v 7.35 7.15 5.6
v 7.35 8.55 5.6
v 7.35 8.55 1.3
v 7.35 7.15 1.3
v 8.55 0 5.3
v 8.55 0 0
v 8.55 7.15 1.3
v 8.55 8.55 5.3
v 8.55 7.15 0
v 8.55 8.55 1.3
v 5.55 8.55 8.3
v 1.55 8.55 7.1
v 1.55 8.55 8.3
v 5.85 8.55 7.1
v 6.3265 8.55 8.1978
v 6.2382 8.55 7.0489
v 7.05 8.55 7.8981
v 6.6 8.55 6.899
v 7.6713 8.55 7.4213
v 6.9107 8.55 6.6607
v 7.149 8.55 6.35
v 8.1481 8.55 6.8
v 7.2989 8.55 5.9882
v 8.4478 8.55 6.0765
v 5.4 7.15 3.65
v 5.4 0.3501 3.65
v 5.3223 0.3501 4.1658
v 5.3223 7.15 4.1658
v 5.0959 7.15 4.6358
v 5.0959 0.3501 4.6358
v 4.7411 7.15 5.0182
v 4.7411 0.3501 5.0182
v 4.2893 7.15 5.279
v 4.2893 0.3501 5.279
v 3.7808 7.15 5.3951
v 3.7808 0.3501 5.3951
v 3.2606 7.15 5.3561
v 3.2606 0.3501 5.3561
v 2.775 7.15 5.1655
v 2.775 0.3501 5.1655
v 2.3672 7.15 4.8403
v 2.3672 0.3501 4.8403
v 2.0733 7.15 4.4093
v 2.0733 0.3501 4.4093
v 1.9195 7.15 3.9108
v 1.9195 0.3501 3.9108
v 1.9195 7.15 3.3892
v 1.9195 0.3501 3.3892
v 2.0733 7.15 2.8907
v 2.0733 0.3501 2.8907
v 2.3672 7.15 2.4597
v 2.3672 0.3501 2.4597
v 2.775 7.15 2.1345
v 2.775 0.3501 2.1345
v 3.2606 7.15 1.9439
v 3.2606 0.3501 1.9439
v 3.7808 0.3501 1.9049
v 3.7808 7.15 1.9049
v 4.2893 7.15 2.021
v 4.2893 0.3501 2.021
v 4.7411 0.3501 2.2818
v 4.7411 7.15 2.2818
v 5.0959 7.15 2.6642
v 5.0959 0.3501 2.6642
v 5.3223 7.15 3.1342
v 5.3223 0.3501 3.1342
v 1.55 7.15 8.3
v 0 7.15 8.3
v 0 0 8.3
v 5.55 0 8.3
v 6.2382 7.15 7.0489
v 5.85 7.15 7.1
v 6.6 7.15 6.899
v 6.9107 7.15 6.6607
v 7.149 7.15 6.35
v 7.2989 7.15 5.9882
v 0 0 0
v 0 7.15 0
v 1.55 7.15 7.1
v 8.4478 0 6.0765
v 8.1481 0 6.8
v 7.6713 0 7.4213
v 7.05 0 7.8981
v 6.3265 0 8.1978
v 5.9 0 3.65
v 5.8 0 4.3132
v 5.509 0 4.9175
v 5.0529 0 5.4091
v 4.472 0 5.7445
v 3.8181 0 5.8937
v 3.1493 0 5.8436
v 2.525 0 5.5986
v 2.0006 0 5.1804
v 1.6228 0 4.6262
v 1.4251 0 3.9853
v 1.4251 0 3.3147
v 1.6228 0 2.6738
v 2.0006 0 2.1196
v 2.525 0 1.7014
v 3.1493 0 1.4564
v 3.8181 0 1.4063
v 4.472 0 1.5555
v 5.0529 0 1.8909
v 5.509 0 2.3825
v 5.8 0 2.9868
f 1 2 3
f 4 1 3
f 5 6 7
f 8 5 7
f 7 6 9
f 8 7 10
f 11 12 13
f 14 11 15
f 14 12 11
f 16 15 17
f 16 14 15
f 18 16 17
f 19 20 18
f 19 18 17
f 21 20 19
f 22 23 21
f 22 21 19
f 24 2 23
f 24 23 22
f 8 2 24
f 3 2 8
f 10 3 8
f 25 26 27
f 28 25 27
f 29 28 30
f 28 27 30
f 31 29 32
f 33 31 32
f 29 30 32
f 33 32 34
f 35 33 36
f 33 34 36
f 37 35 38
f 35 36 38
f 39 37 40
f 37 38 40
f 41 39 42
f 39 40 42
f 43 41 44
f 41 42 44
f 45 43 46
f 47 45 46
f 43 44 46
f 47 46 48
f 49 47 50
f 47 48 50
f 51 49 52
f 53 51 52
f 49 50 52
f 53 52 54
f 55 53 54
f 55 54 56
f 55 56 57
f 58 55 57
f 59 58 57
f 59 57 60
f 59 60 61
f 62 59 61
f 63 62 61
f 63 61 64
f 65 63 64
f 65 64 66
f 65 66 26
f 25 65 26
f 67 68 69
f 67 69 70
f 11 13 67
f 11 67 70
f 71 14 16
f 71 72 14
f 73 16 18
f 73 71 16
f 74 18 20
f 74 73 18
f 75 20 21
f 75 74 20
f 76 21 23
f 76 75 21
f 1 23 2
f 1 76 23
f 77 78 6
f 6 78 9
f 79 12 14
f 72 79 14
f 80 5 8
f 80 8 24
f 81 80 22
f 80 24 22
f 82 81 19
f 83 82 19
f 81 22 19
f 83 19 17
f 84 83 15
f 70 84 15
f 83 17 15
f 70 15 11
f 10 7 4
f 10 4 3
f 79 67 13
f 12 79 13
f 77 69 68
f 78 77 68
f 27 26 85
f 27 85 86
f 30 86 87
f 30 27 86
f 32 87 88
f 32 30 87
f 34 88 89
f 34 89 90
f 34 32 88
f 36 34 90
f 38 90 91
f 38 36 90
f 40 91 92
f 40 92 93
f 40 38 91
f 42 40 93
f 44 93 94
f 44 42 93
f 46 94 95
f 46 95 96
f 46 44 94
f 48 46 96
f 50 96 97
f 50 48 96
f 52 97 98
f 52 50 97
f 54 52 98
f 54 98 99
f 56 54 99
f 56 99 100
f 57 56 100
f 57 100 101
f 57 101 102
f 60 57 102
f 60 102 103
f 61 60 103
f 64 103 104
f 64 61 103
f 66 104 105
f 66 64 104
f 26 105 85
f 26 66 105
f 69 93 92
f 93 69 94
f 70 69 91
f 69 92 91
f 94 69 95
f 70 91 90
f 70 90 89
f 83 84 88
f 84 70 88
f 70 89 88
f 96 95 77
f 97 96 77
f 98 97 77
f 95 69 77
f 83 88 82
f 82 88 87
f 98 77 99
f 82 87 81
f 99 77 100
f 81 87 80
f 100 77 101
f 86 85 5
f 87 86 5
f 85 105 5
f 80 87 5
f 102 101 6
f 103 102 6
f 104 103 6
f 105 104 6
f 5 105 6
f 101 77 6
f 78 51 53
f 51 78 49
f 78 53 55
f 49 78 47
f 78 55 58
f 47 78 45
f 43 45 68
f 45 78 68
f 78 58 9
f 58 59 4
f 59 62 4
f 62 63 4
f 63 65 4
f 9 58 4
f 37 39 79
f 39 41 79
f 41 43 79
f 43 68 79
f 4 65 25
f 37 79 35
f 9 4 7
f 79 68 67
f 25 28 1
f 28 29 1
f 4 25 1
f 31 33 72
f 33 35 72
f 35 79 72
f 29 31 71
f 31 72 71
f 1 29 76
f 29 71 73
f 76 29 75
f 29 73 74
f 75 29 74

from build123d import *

# Parameters (mm, degrees)
SKETCH1_W           = 8.55
SKETCH1_H           = 8.55
BOSS_EXTRUDE1_DEPTH = 8.3
SKETCH2_W           = 1.55
SKETCH2_H           = 1.4
CUT_EXTRUDE1_DEPTH  = 9.3
SKETCH3_W           = 1.3
SKETCH3_H           = 1.4
CUT_EXTRUDE2_DEPTH  = 9.55
SKETCH4_W           = 5.8
SKETCH4_H           = 5.8
CUT_EXTRUDE3_DEPTH  = 1.4
FILLET1_R           = 1.5
FILLET2_R           = 3
SKETCH5_R           = 1.75
CUT_EXTRUDE4_DEPTH  = 9.55
CHAMFER1_SIZE       = 0.5
CHAMFER1_SIZE2      = 0.350103769


with BuildPart() as part:
    # Sketch1 → Boss-Extrude1 (new body)
    with BuildSketch(Plane.XY):
        with Locations((4.275, 4.275)):
            Rectangle(SKETCH1_W, SKETCH1_H)
    extrude(amount=BOSS_EXTRUDE1_DEPTH)

    # Sketch2 → Cut-Extrude1 (cut, through all)
    with BuildSketch(Plane.XY.offset(8.3)):
        with Locations((0.775, 7.85)):
            Rectangle(SKETCH2_W, SKETCH2_H)
    extrude(amount=-CUT_EXTRUDE1_DEPTH, mode=Mode.SUBTRACT)

    # Sketch3 → Cut-Extrude2 (cut, through all)
    with BuildSketch(Plane(origin=(8.55, 0, 0), x_dir=(0, 0, -1), z_dir=(1, 0, 0))):
        with Locations((-0.65, 7.85)):
            Rectangle(SKETCH3_W, SKETCH3_H)
    extrude(amount=-CUT_EXTRUDE2_DEPTH, mode=Mode.SUBTRACT)

    # Sketch4 → Cut-Extrude3 (cut)
    with BuildSketch(Plane(origin=(0, 8.55, 0), x_dir=(1, 0, 0), z_dir=(0, 1, 0))):
        with Locations((4.45, -4.2)):
            Rectangle(SKETCH4_W, SKETCH4_H)
    extrude(amount=-CUT_EXTRUDE3_DEPTH, mode=Mode.SUBTRACT)

    # Fillet1
    fillet1_edges = [part.edges().sort_by_distance(p)[0] for p in [
        (7.35, 7.85, 7.1),
    ]]
    fillet(fillet1_edges, radius=FILLET1_R)

    # Fillet2
    fillet2_edges = [part.edges().sort_by_distance(p)[0] for p in [
        (8.55, 4.275, 8.3),
    ]]
    fillet(fillet2_edges, radius=FILLET2_R)

    # Sketch5 → Cut-Extrude4 (cut, through all)
    with BuildSketch(Plane.XZ):
        with Locations((3.65, 3.65)):
            Circle(SKETCH5_R)
    extrude(amount=-CUT_EXTRUDE4_DEPTH, mode=Mode.SUBTRACT)

    # Chamfer1
    chamfer1_edges = [part.edges().sort_by_distance(p)[0] for p in [
        (1.9, 0, 3.65),
    ]]
    chamfer1_side = [part.faces().sort_by_distance(p)[0] for p in [
        (8.430839394, 0, 2.65),
    ]]
    chamfer(chamfer1_edges, length=CHAMFER1_SIZE, length2=CHAMFER1_SIZE2, reference=chamfer1_side[0])


solid = part.part
